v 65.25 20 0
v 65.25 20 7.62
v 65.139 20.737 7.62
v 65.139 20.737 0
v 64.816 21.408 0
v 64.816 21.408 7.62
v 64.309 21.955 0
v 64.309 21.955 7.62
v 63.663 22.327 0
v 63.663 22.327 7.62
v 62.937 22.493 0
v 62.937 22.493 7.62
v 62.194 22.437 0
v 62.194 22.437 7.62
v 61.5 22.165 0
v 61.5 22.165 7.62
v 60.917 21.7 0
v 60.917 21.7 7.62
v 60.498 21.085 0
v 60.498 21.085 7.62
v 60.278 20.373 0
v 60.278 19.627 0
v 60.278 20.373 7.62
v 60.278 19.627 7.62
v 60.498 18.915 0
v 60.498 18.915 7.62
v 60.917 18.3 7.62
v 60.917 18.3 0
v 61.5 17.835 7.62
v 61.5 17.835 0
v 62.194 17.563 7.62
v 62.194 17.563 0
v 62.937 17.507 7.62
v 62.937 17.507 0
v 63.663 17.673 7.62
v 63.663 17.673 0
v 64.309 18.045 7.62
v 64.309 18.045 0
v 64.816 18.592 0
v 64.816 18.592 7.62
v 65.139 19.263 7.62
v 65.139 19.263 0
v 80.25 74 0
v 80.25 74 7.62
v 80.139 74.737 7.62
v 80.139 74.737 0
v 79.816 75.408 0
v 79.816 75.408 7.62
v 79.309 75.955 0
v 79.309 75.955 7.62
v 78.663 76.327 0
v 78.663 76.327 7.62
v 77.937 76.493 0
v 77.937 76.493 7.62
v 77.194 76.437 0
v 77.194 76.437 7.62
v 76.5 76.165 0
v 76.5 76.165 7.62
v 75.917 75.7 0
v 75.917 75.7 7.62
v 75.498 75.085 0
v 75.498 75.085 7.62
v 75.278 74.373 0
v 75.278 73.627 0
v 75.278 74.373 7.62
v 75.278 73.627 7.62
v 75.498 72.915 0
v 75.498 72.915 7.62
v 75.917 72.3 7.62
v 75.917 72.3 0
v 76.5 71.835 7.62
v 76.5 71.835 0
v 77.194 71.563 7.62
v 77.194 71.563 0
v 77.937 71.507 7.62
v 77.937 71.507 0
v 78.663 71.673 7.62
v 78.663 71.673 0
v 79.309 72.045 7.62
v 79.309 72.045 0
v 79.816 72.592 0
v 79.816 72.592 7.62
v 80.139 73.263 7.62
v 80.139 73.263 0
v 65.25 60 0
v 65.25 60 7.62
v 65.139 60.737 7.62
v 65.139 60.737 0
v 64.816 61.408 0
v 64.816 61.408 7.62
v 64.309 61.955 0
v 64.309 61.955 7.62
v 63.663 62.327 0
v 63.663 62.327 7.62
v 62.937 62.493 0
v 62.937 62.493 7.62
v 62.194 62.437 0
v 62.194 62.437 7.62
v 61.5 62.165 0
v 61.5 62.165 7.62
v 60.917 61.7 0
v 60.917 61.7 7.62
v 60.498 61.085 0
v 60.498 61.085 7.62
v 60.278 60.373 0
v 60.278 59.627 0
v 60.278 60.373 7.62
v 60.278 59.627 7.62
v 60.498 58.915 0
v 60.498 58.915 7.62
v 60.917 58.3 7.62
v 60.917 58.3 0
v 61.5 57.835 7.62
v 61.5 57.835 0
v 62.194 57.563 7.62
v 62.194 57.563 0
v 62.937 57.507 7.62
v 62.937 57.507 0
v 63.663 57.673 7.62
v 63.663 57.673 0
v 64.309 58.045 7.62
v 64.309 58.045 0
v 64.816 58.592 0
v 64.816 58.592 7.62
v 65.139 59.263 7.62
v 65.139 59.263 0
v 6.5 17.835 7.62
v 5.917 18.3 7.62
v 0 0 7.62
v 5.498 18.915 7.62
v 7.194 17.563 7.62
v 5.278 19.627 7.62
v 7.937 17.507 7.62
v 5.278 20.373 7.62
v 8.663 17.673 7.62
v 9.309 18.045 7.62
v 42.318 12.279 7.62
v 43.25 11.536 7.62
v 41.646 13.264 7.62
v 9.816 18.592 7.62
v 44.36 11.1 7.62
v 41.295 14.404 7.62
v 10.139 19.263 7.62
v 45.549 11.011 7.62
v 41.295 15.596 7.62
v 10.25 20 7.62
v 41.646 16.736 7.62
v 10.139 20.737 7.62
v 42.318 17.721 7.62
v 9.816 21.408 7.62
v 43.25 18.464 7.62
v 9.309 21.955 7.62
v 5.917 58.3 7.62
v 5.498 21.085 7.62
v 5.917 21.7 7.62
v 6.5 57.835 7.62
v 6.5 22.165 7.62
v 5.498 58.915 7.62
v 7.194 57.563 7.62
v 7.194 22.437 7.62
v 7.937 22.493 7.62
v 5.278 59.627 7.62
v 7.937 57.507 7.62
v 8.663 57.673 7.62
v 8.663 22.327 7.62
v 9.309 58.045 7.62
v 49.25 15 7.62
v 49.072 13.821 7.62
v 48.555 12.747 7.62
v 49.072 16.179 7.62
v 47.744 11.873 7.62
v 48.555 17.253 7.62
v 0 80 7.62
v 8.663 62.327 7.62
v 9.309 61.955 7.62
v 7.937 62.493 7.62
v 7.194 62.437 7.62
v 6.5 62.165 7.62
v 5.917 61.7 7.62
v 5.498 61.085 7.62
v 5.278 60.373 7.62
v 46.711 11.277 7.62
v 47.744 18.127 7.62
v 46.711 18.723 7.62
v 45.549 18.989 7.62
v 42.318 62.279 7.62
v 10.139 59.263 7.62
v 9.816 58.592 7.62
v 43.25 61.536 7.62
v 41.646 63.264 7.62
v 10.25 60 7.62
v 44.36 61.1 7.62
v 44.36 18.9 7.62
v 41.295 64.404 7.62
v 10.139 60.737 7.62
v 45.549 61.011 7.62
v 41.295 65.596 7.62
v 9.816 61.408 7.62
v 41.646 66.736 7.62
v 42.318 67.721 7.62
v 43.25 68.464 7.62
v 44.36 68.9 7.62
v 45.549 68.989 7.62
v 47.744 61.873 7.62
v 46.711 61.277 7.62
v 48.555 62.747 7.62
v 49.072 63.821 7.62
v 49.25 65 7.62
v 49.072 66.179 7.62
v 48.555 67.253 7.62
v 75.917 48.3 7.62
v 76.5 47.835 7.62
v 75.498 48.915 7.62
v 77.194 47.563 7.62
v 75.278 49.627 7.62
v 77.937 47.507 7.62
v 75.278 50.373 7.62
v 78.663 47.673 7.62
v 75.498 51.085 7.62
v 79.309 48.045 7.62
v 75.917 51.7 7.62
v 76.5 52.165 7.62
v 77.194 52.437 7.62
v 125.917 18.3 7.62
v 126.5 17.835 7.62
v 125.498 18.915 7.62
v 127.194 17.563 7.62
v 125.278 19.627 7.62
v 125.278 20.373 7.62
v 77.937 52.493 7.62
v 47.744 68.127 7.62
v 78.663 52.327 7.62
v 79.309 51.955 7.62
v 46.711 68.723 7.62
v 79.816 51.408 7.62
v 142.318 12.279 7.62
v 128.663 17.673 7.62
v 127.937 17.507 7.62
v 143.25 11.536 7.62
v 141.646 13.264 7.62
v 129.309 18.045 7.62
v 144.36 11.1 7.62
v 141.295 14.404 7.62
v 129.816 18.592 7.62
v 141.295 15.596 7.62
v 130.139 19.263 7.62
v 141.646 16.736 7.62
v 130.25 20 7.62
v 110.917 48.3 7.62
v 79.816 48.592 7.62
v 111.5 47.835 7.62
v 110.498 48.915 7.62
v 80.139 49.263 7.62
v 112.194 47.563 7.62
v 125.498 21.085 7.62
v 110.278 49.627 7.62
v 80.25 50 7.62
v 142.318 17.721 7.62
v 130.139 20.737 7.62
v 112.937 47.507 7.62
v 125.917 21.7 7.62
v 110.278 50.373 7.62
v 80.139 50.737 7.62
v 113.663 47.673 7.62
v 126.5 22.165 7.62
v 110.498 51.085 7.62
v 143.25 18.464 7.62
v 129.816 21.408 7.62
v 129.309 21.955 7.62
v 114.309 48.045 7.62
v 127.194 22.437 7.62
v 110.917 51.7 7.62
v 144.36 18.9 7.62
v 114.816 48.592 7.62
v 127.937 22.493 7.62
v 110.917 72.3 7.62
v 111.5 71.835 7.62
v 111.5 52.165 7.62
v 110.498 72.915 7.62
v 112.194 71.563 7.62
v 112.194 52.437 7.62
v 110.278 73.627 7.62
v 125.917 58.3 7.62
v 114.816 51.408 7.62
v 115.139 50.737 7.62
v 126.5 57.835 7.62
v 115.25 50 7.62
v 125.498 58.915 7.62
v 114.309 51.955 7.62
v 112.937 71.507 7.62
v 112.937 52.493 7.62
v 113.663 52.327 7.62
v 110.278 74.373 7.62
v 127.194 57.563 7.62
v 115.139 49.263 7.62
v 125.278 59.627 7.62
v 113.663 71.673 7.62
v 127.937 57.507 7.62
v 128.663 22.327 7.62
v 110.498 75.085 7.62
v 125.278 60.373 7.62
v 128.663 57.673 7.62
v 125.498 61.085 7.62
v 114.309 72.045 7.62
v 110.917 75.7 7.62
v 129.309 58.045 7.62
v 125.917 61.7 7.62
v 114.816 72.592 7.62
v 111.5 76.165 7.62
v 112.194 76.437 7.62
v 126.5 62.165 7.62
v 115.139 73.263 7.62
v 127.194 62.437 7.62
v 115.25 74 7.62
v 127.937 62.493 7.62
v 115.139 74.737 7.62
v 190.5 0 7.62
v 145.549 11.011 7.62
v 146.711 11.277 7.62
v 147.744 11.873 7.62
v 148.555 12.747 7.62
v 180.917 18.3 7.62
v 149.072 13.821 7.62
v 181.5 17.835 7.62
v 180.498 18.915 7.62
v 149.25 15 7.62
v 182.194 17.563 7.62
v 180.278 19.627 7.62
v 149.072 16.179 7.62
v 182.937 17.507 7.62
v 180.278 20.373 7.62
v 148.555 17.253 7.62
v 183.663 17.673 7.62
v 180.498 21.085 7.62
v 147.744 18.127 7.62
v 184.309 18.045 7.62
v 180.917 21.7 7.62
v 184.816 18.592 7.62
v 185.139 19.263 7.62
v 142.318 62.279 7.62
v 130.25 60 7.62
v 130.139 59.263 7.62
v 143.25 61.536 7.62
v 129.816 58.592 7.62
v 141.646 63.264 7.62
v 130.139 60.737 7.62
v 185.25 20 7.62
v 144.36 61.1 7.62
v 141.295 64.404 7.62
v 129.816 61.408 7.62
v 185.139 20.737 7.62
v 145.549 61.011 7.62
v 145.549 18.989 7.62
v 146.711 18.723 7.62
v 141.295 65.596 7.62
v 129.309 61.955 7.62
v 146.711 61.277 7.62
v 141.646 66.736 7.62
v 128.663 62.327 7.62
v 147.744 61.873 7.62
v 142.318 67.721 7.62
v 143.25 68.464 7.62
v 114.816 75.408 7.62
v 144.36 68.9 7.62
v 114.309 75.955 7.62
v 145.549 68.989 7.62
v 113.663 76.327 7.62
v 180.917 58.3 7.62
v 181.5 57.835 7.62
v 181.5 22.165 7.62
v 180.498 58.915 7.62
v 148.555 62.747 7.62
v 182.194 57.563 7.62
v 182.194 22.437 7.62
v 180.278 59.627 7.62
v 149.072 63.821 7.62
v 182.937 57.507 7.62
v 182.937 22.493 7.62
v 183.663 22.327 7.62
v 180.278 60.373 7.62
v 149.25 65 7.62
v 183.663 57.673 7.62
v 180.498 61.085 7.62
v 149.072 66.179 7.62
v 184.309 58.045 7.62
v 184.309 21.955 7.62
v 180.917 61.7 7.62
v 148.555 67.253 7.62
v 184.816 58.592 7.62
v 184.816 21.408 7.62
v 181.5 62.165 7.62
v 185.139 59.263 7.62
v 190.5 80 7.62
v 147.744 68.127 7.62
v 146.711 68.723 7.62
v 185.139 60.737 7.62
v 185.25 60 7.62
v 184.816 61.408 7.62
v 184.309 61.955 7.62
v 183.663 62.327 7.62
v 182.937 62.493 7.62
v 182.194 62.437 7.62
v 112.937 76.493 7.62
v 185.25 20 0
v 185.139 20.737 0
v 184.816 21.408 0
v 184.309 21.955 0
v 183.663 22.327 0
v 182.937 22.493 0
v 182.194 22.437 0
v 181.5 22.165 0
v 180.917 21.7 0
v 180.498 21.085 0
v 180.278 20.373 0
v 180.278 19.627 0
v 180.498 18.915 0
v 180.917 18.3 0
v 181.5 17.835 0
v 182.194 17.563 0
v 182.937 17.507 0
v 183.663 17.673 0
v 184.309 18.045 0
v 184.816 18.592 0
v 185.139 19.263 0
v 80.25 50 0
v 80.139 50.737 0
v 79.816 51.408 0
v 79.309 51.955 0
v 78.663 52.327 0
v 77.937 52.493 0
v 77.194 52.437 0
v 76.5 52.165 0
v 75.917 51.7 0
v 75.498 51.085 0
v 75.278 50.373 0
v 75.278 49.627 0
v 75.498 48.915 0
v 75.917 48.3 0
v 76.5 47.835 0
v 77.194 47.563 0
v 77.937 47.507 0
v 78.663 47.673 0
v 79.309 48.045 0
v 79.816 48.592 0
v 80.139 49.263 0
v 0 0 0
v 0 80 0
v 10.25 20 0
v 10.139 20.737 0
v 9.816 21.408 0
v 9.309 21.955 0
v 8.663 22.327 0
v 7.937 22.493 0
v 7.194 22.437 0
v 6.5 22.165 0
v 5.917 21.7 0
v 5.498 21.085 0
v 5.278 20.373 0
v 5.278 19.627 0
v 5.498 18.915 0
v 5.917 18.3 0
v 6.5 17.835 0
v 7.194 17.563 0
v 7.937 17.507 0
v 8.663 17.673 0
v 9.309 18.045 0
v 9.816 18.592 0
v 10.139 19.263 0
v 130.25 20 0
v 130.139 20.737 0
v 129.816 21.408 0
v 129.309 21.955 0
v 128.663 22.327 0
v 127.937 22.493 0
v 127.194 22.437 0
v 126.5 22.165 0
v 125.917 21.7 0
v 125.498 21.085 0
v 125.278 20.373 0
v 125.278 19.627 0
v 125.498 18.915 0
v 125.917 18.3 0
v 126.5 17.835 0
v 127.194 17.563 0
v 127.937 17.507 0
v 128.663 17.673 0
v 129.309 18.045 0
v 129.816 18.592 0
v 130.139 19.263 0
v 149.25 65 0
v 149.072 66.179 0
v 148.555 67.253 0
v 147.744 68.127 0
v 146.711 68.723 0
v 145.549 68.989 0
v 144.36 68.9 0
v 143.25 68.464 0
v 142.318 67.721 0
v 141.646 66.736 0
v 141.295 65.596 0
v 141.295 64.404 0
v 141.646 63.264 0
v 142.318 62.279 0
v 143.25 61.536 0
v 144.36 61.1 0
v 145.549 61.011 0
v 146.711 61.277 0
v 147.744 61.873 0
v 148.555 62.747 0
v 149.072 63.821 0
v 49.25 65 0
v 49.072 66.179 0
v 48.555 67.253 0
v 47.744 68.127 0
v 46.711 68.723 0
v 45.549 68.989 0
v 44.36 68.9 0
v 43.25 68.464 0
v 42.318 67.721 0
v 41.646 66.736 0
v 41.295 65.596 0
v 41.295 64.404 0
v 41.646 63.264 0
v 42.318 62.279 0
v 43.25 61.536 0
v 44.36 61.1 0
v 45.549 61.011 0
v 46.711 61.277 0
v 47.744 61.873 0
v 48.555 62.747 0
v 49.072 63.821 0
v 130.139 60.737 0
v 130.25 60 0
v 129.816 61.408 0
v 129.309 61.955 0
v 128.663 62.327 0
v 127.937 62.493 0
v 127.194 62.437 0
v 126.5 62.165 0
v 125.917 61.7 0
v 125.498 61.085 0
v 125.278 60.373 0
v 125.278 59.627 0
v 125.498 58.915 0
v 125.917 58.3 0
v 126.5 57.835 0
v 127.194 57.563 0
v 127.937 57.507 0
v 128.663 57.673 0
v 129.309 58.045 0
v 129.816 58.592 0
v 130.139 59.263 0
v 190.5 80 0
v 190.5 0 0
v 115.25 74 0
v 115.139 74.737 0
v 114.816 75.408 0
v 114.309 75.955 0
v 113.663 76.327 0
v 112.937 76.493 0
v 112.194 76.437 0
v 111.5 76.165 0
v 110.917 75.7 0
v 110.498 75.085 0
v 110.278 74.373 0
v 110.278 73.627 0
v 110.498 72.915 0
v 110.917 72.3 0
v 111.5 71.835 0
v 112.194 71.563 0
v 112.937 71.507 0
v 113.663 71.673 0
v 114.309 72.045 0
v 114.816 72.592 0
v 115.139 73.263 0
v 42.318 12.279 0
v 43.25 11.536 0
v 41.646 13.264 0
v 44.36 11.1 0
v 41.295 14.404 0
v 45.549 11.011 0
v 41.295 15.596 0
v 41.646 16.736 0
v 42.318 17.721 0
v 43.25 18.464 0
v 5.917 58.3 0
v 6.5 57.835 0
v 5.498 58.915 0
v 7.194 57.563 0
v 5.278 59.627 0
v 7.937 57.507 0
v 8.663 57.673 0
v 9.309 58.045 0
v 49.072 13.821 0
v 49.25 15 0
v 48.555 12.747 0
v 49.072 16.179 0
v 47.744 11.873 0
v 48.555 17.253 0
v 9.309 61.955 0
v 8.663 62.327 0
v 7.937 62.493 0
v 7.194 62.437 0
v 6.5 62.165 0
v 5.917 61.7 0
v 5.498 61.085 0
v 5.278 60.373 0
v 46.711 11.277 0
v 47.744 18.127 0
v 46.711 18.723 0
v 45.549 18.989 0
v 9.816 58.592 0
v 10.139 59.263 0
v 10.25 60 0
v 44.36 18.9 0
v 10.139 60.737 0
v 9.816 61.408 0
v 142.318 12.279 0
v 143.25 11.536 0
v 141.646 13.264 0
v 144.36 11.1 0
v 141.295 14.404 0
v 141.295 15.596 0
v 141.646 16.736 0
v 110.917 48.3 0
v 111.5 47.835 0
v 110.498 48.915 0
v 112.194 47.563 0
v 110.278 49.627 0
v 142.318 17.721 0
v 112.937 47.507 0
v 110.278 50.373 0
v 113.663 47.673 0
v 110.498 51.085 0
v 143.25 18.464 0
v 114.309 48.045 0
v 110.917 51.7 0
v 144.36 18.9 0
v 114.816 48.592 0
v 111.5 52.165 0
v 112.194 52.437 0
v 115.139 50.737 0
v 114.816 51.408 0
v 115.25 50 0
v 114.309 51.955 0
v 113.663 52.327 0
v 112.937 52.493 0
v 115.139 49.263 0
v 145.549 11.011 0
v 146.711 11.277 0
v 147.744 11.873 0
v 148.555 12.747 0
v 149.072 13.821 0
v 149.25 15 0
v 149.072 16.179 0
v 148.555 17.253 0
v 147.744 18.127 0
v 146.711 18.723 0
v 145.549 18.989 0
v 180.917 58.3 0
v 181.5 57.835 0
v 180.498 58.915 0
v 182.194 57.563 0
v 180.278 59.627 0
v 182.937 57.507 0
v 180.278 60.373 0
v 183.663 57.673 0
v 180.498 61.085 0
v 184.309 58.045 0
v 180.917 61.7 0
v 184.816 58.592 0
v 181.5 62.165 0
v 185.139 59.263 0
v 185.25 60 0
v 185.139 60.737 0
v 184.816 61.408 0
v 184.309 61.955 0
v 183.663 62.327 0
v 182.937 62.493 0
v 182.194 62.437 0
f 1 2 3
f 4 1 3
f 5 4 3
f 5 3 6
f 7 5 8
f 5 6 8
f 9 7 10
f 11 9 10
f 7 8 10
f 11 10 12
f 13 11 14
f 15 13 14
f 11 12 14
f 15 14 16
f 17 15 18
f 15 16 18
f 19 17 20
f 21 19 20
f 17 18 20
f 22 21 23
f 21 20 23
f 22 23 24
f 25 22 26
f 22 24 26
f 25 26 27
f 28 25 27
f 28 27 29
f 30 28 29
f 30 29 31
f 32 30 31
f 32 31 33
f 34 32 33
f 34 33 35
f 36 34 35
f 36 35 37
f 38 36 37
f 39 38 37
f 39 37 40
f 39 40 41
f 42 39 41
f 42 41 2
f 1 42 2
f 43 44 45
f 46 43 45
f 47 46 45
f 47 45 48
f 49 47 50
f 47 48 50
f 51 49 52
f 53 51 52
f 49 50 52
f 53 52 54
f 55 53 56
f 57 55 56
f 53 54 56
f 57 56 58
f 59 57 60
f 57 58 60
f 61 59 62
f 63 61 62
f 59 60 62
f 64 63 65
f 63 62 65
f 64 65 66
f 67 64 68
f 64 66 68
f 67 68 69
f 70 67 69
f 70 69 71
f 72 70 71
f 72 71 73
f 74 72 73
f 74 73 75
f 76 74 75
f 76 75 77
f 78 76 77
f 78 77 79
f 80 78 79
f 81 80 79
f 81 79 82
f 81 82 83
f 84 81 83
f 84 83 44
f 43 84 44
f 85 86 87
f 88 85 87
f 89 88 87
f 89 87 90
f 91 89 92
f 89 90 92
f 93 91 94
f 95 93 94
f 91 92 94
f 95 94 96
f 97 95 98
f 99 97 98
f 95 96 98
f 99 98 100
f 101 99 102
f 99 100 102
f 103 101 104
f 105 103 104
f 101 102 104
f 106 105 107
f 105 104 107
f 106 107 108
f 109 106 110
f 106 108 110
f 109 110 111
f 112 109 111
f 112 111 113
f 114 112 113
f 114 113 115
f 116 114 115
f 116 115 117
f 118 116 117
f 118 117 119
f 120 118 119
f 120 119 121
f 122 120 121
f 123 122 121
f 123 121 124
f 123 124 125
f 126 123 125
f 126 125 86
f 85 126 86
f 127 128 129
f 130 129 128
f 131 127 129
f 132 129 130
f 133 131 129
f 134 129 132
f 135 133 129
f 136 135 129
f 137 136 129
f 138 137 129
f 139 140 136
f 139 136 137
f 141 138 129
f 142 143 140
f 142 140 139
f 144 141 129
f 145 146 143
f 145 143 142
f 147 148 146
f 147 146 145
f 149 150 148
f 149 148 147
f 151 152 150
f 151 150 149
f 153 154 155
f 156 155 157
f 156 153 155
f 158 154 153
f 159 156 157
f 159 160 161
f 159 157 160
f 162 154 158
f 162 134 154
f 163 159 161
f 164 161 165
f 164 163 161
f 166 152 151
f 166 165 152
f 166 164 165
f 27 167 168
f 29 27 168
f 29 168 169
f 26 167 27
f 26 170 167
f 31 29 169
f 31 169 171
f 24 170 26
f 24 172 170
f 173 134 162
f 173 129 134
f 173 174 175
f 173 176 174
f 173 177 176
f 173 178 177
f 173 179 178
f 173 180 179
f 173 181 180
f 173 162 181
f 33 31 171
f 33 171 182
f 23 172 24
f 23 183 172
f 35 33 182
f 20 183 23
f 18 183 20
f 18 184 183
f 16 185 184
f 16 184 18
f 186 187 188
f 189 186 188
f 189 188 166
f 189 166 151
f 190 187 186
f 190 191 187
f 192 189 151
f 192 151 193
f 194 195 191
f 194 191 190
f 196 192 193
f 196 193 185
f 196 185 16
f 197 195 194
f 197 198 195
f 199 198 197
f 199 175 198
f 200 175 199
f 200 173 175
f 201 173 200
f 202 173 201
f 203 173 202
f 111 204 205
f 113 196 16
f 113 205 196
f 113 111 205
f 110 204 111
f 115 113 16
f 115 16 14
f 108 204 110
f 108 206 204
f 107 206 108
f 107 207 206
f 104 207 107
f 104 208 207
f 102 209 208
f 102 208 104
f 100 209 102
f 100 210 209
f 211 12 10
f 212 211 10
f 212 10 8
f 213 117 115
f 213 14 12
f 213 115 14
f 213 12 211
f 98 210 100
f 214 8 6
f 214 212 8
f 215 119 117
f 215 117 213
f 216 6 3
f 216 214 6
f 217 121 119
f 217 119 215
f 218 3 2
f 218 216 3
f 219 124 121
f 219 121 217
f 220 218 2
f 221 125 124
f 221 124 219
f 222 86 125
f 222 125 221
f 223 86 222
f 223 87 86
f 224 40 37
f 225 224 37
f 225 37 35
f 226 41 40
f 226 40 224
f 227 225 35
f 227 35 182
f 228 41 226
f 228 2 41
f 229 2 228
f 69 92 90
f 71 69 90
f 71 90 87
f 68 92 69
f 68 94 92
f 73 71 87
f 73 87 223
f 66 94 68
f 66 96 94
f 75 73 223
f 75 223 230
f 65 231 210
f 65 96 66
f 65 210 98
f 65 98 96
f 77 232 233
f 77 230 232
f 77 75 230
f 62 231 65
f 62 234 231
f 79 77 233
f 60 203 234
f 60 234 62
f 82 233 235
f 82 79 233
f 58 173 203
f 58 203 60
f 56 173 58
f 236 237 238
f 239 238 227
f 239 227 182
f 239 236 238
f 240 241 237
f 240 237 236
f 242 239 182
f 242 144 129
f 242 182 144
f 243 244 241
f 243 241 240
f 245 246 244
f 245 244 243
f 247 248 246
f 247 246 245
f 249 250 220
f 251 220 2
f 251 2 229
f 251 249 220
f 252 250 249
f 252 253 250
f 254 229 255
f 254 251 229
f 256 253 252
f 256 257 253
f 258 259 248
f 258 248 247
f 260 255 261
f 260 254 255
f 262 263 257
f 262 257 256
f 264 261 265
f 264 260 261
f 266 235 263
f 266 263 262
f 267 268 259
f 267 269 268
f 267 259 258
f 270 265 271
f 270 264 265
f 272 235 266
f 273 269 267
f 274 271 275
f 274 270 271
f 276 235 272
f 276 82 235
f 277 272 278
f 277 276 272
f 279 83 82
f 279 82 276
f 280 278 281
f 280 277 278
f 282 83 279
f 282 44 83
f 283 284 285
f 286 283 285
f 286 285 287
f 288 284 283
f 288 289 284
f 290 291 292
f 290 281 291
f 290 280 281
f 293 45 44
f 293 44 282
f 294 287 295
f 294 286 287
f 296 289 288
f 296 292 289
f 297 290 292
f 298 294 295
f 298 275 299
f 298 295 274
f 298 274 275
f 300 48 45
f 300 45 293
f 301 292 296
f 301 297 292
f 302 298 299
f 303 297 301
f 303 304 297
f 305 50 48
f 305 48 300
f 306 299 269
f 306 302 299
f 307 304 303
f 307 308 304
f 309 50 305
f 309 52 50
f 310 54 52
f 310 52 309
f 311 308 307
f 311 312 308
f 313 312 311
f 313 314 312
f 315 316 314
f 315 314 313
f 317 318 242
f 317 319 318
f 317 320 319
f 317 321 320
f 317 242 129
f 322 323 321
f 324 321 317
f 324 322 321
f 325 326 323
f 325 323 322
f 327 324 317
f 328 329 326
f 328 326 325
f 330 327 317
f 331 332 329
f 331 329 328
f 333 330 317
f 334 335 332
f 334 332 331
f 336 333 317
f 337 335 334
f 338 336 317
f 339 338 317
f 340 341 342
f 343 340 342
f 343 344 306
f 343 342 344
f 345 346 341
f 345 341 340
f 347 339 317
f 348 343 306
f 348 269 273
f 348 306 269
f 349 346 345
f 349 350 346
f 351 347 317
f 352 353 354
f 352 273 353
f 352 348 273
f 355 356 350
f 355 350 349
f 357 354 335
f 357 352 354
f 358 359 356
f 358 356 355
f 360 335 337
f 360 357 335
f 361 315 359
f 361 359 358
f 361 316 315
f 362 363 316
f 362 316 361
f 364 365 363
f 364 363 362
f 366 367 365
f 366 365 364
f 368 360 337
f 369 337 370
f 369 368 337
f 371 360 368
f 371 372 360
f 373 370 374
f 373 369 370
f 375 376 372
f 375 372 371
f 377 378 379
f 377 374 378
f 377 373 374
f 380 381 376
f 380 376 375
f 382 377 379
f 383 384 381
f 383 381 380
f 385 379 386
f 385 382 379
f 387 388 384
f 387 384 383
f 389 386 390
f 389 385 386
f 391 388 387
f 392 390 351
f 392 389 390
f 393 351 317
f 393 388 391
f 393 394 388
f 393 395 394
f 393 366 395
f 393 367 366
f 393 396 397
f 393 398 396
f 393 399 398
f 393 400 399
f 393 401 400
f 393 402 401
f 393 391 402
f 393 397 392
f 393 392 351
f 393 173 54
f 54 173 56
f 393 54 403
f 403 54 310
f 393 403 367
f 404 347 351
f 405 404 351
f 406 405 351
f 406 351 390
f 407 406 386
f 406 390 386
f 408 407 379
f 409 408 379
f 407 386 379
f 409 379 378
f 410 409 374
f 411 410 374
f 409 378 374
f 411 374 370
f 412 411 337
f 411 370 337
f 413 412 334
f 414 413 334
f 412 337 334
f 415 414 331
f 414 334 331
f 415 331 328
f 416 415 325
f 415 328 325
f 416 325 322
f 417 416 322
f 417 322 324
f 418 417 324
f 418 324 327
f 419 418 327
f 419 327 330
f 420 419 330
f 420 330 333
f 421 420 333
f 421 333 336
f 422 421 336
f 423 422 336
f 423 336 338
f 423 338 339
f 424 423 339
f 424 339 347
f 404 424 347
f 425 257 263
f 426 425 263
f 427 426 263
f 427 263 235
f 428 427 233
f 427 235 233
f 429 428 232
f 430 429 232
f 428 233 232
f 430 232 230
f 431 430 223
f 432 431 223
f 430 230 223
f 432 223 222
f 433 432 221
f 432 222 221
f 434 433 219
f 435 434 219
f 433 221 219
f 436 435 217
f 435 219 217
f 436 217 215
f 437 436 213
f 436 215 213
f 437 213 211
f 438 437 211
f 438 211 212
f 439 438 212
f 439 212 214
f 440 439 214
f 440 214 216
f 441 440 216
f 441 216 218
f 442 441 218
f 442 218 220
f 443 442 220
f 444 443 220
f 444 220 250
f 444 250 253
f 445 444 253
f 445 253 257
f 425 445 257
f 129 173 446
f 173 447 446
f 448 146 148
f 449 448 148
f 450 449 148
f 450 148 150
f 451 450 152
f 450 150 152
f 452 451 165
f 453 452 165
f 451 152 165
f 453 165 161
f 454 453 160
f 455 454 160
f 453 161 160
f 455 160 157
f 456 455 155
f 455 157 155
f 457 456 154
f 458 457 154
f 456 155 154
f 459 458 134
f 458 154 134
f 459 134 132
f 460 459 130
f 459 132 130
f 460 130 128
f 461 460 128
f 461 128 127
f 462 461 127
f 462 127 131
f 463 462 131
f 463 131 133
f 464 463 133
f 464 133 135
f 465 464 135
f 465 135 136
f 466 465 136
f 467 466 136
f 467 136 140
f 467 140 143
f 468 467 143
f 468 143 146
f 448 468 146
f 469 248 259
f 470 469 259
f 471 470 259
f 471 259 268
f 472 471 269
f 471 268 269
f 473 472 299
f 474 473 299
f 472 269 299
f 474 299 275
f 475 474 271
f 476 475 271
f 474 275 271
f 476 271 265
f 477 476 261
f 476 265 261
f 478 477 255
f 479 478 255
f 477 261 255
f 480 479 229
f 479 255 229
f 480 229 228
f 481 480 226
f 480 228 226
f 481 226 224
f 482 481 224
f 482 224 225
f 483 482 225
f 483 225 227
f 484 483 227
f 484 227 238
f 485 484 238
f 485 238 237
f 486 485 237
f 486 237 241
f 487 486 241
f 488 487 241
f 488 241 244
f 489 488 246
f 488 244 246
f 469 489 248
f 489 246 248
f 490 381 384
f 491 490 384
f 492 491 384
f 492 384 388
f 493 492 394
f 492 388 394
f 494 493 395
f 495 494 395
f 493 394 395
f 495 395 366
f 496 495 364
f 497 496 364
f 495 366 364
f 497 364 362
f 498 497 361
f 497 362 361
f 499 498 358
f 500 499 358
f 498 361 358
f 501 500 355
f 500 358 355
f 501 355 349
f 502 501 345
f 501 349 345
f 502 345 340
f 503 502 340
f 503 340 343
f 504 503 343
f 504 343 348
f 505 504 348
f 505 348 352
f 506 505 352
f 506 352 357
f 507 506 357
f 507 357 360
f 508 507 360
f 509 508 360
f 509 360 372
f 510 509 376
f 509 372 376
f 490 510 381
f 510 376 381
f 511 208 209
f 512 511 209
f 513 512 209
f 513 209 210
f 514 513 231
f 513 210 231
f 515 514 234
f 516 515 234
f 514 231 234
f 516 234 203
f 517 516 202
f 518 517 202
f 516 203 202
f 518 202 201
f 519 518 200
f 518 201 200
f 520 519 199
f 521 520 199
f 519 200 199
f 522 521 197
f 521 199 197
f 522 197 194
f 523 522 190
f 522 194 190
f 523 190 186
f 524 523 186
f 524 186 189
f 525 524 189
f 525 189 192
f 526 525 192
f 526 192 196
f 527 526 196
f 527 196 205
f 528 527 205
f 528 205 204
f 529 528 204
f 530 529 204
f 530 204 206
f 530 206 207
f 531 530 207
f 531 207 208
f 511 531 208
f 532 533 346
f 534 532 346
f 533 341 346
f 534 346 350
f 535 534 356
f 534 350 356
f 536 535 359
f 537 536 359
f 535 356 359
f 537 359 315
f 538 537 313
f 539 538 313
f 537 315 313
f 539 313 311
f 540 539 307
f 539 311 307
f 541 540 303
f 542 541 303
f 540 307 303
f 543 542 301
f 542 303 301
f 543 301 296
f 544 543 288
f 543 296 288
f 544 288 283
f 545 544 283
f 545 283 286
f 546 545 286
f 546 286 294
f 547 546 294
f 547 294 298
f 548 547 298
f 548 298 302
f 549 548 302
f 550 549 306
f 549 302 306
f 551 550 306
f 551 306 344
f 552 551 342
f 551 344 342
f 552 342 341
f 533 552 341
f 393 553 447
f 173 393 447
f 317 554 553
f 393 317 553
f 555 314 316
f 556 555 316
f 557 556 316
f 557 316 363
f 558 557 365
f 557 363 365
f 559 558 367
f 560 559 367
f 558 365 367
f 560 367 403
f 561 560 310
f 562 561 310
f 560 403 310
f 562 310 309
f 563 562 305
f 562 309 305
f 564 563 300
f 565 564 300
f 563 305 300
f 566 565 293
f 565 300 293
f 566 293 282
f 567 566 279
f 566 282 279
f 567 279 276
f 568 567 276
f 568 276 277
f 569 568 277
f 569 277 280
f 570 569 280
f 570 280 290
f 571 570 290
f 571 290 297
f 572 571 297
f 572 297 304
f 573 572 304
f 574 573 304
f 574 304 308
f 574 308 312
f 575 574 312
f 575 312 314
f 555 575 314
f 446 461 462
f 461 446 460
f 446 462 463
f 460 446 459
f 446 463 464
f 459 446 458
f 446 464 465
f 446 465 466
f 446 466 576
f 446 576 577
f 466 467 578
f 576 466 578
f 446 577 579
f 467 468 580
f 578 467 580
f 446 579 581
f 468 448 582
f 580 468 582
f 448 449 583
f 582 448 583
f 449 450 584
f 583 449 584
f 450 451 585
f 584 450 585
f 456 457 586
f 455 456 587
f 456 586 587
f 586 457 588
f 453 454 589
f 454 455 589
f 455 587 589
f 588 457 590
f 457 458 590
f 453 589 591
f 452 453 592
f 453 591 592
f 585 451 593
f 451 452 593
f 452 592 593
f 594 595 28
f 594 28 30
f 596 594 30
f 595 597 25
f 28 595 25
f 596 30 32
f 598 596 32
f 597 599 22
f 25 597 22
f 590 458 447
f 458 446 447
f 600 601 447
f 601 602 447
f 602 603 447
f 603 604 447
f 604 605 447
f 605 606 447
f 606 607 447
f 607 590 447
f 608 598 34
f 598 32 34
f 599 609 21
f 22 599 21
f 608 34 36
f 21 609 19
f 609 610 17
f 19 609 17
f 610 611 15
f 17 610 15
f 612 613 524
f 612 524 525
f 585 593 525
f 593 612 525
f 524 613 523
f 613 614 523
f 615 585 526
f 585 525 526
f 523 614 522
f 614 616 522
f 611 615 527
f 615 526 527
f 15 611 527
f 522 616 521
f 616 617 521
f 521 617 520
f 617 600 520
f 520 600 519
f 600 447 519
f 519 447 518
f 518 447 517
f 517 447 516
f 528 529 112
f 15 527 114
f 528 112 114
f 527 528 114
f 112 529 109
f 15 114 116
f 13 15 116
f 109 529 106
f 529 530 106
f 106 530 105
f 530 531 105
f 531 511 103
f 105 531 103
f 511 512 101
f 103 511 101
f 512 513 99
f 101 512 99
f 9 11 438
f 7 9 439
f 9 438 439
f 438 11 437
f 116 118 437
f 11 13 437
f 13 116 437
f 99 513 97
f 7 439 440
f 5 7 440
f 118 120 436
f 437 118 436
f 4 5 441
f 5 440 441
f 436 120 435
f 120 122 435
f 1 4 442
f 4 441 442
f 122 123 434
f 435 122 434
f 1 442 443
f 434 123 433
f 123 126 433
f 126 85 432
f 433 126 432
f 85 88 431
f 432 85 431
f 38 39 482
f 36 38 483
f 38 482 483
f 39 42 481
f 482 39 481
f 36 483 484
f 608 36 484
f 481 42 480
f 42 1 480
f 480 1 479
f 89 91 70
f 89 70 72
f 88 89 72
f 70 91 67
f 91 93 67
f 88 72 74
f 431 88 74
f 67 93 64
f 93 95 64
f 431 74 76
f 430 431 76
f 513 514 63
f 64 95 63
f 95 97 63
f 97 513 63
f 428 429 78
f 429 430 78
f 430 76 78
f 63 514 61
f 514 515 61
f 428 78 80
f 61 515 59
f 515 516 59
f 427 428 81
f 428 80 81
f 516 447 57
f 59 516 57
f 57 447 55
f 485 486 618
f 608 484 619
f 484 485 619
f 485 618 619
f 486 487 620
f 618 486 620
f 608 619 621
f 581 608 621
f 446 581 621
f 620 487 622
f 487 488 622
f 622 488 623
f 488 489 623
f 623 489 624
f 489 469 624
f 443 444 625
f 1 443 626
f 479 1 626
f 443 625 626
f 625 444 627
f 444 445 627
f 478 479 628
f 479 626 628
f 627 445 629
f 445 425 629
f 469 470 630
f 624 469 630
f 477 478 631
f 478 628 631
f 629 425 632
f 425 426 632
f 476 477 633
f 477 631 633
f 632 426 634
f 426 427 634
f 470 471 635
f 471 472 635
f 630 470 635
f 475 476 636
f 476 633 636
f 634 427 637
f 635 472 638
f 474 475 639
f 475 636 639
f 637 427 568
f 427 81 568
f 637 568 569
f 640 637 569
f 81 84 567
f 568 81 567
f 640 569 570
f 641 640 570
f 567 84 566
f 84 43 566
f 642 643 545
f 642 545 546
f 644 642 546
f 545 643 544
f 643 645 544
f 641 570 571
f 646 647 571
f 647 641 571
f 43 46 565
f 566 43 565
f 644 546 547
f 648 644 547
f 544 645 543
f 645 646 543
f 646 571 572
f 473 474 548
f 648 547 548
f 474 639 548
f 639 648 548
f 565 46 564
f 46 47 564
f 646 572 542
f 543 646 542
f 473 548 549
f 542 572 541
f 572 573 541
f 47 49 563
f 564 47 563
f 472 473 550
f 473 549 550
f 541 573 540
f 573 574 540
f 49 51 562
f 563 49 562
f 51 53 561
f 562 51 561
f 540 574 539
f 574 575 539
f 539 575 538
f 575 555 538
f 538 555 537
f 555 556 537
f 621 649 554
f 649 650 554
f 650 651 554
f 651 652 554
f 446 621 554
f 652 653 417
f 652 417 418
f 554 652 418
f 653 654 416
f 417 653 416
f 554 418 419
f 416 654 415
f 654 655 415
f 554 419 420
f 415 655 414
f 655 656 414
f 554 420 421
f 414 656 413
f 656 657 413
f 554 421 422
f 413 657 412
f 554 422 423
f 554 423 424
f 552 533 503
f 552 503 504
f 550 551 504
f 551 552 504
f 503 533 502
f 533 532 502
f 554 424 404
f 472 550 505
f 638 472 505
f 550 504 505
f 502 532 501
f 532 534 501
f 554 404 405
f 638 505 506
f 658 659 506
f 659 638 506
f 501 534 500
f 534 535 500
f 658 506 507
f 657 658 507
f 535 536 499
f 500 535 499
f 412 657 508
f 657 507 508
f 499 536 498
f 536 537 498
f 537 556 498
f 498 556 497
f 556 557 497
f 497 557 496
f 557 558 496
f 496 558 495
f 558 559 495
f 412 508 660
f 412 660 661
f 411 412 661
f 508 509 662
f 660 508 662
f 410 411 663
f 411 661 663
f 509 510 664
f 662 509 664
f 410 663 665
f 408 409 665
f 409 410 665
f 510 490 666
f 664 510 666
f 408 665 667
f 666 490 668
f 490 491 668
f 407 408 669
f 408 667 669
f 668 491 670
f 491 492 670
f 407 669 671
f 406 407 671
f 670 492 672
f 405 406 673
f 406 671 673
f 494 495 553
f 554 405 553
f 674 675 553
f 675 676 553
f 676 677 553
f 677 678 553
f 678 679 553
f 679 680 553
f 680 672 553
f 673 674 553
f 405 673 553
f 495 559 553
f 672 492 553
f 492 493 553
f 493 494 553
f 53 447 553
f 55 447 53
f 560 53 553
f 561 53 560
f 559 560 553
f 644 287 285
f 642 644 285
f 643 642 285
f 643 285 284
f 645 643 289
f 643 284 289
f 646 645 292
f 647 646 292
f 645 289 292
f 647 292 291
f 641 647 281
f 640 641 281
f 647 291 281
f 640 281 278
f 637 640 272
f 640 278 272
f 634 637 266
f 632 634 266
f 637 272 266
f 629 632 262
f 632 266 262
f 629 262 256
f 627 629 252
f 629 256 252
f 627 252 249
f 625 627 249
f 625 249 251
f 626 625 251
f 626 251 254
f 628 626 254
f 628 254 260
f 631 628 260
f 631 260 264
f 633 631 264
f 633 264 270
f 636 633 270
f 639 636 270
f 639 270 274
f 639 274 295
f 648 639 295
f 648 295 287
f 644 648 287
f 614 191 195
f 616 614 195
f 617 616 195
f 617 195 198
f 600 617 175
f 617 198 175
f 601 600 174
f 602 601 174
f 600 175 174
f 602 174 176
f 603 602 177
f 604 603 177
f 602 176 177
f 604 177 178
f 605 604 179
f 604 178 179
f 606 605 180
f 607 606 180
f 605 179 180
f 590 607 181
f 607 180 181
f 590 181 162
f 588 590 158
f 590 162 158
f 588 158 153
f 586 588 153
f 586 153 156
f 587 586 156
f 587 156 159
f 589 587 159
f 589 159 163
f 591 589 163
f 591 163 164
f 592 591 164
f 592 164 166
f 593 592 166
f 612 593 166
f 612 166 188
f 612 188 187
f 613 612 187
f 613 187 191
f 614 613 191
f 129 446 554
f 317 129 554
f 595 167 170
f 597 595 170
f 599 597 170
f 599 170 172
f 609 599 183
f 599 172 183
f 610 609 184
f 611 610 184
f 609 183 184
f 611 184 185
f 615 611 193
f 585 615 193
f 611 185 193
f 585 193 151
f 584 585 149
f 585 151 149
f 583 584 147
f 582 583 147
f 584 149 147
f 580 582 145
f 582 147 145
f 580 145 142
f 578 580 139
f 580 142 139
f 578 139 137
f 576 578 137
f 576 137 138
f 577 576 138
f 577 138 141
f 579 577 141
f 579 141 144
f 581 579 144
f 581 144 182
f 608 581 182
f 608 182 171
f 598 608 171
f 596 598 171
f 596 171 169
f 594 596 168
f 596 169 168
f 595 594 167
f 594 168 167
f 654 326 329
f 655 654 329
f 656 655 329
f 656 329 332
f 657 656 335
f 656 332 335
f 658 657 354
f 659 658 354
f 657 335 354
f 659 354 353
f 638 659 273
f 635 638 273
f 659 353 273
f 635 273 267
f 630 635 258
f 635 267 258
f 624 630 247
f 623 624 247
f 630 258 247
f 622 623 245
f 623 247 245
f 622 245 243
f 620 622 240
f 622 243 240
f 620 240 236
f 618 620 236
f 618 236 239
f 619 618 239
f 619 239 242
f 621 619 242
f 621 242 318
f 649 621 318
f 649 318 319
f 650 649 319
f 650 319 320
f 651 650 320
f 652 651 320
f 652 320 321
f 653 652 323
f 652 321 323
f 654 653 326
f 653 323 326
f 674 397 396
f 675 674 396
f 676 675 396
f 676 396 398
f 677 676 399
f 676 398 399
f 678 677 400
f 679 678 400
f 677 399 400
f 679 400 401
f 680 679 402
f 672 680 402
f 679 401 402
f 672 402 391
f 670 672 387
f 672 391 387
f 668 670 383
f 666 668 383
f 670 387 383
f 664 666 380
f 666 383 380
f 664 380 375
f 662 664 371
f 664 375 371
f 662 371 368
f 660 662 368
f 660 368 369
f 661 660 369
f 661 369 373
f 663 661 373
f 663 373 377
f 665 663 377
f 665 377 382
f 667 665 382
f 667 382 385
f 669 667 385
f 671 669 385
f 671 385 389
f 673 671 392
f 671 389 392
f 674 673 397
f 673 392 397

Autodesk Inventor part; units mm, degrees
ref_plane "YZ Plane" through (0, 0, 0) normal (1, 0, 0) x (0, 1, 0)
ref_plane "XZ Plane" through (0, 0, 0) normal (0, 1, 0) x (-1, 0, 0)
ref_plane "XY Plane" through (0, 0, 0) normal (0, 0, 1) x (1, 0, 0)
sketch "Sketch1" plane through (0, 0, 0) normal (0, 0, 1) x (1, 0, 0)
  line L0 (0, 0) -> (190.5, 0)
  line L1 (190.5, 0) -> (190.5, 80)
  line L2 (190.5, 80) -> (0, 80)
  line L3 (0, 80) -> (0, 0)
  dimension "d0" = 80
  dimension "d1" = 190.5
extrude "Extrusion1" add sketch "Sketch1" along normal blind 7.62
sketch "Sketch2" plane through (0, 0, 7.62) normal (0, 0, 1) x (1, 0, 0)
  line L0 (45.25, 15) -> (145.25, 15) construction
  line L1 (145.25, 15) -> (145.25, 65) construction
  line L2 (145.25, 65) -> (45.25, 65) construction
  line L3 (45.25, 65) -> (45.25, 15) construction
  line L4 (190.5, 80) -> (0, 80) construction
  line L5 (190.5, 0) -> (190.5, 80) construction
  circle A0 centre (45.25, 65) radius 4
  circle A1 centre (145.25, 65) radius 4
  circle A2 centre (45.25, 15) radius 4
  circle A3 centre (145.25, 15) radius 4
  point P0 (0, 0)
  point P1 (95.25, 65)
  point P2 (95.25, 80)
  point P3 (145.25, 40)
  point P4 (190.5, 40)
  dimension "d4" = 100
  dimension "d5" = 50
  dimension "d6" = 8
extrude "Extrusion2" cut sketch "Sketch2" against normal up to surface (7.62 mm away)
sketch "Sketch3" plane through (0, 0, 7.62) normal (0, 0, 1) x (1, 0, 0)
  line L0 (7.75, 20) -> (62.75, 20) construction
  line L1 (62.75, 20) -> (62.75, 60) construction
  line L2 (62.75, 60) -> (7.75, 60) construction
  line L3 (7.75, 60) -> (7.75, 20) construction
  circle A0 centre (7.75, 60) radius 2.5
  circle A1 centre (62.75, 60) radius 2.5
  circle A2 centre (7.75, 20) radius 2.5
  circle A3 centre (62.75, 20) radius 2.5
  line L4 (190.5, 80) -> (0, 80) construction
  line L5 (95.25, 80) -> (95.25, 0)
  line L6 (0, 0) -> (190.5, 0) construction
  circle A4 centre (182.75, 60) radius 2.5
  circle A5 centre (127.75, 60) radius 2.5
  circle A6 centre (182.75, 20) radius 2.5
  circle A7 centre (127.75, 20) radius 2.5
  point P0 (62.75, 40)
  point P1 (35.25, 60)
  point P2 (95.25, 40)
  dimension "d9" = 5
  dimension "d10" = 55
  dimension "d11" = 40
  dimension "d12" = 60
extrude "Extrusion3" cut sketch "Sketch3" against normal up to surface (7.62 mm away)
sketch "Sketch4" plane through (0, 0, 7.62) normal (0, 0, 1) x (1, 0, 0)
  line L0 (77.75, 50) -> (112.75, 50) construction
  line L1 (112.75, 50) -> (112.75, 74) construction
  line L2 (112.75, 74) -> (77.75, 74) construction
  line L3 (77.75, 74) -> (77.75, 50) construction
  circle A0 centre (112.75, 50) radius 2.5
  circle A1 centre (112.75, 74) radius 2.5
  circle A2 centre (77.75, 74) radius 2.5
  circle A3 centre (77.75, 50) radius 2.5
  line L4 (190.5, 80) -> (0, 80) construction
  line L5 (190.5, 0) -> (190.5, 80) construction
  point P0 (0, 0)
  point P1 (95.25, 50)
  point P2 (95.25, 80)
  point P3 (190.5, 40)
  point P4 (112.75, 62)
  dimension "d15" = 5
  dimension "d16" = 35
  dimension "d17" = 24
  dimension "d18" = 6
extrude "Extrusion4" cut sketch "Sketch4" against normal up to surface (7.62 mm away)
properties part number "Spindle_Mounting_Plate"
